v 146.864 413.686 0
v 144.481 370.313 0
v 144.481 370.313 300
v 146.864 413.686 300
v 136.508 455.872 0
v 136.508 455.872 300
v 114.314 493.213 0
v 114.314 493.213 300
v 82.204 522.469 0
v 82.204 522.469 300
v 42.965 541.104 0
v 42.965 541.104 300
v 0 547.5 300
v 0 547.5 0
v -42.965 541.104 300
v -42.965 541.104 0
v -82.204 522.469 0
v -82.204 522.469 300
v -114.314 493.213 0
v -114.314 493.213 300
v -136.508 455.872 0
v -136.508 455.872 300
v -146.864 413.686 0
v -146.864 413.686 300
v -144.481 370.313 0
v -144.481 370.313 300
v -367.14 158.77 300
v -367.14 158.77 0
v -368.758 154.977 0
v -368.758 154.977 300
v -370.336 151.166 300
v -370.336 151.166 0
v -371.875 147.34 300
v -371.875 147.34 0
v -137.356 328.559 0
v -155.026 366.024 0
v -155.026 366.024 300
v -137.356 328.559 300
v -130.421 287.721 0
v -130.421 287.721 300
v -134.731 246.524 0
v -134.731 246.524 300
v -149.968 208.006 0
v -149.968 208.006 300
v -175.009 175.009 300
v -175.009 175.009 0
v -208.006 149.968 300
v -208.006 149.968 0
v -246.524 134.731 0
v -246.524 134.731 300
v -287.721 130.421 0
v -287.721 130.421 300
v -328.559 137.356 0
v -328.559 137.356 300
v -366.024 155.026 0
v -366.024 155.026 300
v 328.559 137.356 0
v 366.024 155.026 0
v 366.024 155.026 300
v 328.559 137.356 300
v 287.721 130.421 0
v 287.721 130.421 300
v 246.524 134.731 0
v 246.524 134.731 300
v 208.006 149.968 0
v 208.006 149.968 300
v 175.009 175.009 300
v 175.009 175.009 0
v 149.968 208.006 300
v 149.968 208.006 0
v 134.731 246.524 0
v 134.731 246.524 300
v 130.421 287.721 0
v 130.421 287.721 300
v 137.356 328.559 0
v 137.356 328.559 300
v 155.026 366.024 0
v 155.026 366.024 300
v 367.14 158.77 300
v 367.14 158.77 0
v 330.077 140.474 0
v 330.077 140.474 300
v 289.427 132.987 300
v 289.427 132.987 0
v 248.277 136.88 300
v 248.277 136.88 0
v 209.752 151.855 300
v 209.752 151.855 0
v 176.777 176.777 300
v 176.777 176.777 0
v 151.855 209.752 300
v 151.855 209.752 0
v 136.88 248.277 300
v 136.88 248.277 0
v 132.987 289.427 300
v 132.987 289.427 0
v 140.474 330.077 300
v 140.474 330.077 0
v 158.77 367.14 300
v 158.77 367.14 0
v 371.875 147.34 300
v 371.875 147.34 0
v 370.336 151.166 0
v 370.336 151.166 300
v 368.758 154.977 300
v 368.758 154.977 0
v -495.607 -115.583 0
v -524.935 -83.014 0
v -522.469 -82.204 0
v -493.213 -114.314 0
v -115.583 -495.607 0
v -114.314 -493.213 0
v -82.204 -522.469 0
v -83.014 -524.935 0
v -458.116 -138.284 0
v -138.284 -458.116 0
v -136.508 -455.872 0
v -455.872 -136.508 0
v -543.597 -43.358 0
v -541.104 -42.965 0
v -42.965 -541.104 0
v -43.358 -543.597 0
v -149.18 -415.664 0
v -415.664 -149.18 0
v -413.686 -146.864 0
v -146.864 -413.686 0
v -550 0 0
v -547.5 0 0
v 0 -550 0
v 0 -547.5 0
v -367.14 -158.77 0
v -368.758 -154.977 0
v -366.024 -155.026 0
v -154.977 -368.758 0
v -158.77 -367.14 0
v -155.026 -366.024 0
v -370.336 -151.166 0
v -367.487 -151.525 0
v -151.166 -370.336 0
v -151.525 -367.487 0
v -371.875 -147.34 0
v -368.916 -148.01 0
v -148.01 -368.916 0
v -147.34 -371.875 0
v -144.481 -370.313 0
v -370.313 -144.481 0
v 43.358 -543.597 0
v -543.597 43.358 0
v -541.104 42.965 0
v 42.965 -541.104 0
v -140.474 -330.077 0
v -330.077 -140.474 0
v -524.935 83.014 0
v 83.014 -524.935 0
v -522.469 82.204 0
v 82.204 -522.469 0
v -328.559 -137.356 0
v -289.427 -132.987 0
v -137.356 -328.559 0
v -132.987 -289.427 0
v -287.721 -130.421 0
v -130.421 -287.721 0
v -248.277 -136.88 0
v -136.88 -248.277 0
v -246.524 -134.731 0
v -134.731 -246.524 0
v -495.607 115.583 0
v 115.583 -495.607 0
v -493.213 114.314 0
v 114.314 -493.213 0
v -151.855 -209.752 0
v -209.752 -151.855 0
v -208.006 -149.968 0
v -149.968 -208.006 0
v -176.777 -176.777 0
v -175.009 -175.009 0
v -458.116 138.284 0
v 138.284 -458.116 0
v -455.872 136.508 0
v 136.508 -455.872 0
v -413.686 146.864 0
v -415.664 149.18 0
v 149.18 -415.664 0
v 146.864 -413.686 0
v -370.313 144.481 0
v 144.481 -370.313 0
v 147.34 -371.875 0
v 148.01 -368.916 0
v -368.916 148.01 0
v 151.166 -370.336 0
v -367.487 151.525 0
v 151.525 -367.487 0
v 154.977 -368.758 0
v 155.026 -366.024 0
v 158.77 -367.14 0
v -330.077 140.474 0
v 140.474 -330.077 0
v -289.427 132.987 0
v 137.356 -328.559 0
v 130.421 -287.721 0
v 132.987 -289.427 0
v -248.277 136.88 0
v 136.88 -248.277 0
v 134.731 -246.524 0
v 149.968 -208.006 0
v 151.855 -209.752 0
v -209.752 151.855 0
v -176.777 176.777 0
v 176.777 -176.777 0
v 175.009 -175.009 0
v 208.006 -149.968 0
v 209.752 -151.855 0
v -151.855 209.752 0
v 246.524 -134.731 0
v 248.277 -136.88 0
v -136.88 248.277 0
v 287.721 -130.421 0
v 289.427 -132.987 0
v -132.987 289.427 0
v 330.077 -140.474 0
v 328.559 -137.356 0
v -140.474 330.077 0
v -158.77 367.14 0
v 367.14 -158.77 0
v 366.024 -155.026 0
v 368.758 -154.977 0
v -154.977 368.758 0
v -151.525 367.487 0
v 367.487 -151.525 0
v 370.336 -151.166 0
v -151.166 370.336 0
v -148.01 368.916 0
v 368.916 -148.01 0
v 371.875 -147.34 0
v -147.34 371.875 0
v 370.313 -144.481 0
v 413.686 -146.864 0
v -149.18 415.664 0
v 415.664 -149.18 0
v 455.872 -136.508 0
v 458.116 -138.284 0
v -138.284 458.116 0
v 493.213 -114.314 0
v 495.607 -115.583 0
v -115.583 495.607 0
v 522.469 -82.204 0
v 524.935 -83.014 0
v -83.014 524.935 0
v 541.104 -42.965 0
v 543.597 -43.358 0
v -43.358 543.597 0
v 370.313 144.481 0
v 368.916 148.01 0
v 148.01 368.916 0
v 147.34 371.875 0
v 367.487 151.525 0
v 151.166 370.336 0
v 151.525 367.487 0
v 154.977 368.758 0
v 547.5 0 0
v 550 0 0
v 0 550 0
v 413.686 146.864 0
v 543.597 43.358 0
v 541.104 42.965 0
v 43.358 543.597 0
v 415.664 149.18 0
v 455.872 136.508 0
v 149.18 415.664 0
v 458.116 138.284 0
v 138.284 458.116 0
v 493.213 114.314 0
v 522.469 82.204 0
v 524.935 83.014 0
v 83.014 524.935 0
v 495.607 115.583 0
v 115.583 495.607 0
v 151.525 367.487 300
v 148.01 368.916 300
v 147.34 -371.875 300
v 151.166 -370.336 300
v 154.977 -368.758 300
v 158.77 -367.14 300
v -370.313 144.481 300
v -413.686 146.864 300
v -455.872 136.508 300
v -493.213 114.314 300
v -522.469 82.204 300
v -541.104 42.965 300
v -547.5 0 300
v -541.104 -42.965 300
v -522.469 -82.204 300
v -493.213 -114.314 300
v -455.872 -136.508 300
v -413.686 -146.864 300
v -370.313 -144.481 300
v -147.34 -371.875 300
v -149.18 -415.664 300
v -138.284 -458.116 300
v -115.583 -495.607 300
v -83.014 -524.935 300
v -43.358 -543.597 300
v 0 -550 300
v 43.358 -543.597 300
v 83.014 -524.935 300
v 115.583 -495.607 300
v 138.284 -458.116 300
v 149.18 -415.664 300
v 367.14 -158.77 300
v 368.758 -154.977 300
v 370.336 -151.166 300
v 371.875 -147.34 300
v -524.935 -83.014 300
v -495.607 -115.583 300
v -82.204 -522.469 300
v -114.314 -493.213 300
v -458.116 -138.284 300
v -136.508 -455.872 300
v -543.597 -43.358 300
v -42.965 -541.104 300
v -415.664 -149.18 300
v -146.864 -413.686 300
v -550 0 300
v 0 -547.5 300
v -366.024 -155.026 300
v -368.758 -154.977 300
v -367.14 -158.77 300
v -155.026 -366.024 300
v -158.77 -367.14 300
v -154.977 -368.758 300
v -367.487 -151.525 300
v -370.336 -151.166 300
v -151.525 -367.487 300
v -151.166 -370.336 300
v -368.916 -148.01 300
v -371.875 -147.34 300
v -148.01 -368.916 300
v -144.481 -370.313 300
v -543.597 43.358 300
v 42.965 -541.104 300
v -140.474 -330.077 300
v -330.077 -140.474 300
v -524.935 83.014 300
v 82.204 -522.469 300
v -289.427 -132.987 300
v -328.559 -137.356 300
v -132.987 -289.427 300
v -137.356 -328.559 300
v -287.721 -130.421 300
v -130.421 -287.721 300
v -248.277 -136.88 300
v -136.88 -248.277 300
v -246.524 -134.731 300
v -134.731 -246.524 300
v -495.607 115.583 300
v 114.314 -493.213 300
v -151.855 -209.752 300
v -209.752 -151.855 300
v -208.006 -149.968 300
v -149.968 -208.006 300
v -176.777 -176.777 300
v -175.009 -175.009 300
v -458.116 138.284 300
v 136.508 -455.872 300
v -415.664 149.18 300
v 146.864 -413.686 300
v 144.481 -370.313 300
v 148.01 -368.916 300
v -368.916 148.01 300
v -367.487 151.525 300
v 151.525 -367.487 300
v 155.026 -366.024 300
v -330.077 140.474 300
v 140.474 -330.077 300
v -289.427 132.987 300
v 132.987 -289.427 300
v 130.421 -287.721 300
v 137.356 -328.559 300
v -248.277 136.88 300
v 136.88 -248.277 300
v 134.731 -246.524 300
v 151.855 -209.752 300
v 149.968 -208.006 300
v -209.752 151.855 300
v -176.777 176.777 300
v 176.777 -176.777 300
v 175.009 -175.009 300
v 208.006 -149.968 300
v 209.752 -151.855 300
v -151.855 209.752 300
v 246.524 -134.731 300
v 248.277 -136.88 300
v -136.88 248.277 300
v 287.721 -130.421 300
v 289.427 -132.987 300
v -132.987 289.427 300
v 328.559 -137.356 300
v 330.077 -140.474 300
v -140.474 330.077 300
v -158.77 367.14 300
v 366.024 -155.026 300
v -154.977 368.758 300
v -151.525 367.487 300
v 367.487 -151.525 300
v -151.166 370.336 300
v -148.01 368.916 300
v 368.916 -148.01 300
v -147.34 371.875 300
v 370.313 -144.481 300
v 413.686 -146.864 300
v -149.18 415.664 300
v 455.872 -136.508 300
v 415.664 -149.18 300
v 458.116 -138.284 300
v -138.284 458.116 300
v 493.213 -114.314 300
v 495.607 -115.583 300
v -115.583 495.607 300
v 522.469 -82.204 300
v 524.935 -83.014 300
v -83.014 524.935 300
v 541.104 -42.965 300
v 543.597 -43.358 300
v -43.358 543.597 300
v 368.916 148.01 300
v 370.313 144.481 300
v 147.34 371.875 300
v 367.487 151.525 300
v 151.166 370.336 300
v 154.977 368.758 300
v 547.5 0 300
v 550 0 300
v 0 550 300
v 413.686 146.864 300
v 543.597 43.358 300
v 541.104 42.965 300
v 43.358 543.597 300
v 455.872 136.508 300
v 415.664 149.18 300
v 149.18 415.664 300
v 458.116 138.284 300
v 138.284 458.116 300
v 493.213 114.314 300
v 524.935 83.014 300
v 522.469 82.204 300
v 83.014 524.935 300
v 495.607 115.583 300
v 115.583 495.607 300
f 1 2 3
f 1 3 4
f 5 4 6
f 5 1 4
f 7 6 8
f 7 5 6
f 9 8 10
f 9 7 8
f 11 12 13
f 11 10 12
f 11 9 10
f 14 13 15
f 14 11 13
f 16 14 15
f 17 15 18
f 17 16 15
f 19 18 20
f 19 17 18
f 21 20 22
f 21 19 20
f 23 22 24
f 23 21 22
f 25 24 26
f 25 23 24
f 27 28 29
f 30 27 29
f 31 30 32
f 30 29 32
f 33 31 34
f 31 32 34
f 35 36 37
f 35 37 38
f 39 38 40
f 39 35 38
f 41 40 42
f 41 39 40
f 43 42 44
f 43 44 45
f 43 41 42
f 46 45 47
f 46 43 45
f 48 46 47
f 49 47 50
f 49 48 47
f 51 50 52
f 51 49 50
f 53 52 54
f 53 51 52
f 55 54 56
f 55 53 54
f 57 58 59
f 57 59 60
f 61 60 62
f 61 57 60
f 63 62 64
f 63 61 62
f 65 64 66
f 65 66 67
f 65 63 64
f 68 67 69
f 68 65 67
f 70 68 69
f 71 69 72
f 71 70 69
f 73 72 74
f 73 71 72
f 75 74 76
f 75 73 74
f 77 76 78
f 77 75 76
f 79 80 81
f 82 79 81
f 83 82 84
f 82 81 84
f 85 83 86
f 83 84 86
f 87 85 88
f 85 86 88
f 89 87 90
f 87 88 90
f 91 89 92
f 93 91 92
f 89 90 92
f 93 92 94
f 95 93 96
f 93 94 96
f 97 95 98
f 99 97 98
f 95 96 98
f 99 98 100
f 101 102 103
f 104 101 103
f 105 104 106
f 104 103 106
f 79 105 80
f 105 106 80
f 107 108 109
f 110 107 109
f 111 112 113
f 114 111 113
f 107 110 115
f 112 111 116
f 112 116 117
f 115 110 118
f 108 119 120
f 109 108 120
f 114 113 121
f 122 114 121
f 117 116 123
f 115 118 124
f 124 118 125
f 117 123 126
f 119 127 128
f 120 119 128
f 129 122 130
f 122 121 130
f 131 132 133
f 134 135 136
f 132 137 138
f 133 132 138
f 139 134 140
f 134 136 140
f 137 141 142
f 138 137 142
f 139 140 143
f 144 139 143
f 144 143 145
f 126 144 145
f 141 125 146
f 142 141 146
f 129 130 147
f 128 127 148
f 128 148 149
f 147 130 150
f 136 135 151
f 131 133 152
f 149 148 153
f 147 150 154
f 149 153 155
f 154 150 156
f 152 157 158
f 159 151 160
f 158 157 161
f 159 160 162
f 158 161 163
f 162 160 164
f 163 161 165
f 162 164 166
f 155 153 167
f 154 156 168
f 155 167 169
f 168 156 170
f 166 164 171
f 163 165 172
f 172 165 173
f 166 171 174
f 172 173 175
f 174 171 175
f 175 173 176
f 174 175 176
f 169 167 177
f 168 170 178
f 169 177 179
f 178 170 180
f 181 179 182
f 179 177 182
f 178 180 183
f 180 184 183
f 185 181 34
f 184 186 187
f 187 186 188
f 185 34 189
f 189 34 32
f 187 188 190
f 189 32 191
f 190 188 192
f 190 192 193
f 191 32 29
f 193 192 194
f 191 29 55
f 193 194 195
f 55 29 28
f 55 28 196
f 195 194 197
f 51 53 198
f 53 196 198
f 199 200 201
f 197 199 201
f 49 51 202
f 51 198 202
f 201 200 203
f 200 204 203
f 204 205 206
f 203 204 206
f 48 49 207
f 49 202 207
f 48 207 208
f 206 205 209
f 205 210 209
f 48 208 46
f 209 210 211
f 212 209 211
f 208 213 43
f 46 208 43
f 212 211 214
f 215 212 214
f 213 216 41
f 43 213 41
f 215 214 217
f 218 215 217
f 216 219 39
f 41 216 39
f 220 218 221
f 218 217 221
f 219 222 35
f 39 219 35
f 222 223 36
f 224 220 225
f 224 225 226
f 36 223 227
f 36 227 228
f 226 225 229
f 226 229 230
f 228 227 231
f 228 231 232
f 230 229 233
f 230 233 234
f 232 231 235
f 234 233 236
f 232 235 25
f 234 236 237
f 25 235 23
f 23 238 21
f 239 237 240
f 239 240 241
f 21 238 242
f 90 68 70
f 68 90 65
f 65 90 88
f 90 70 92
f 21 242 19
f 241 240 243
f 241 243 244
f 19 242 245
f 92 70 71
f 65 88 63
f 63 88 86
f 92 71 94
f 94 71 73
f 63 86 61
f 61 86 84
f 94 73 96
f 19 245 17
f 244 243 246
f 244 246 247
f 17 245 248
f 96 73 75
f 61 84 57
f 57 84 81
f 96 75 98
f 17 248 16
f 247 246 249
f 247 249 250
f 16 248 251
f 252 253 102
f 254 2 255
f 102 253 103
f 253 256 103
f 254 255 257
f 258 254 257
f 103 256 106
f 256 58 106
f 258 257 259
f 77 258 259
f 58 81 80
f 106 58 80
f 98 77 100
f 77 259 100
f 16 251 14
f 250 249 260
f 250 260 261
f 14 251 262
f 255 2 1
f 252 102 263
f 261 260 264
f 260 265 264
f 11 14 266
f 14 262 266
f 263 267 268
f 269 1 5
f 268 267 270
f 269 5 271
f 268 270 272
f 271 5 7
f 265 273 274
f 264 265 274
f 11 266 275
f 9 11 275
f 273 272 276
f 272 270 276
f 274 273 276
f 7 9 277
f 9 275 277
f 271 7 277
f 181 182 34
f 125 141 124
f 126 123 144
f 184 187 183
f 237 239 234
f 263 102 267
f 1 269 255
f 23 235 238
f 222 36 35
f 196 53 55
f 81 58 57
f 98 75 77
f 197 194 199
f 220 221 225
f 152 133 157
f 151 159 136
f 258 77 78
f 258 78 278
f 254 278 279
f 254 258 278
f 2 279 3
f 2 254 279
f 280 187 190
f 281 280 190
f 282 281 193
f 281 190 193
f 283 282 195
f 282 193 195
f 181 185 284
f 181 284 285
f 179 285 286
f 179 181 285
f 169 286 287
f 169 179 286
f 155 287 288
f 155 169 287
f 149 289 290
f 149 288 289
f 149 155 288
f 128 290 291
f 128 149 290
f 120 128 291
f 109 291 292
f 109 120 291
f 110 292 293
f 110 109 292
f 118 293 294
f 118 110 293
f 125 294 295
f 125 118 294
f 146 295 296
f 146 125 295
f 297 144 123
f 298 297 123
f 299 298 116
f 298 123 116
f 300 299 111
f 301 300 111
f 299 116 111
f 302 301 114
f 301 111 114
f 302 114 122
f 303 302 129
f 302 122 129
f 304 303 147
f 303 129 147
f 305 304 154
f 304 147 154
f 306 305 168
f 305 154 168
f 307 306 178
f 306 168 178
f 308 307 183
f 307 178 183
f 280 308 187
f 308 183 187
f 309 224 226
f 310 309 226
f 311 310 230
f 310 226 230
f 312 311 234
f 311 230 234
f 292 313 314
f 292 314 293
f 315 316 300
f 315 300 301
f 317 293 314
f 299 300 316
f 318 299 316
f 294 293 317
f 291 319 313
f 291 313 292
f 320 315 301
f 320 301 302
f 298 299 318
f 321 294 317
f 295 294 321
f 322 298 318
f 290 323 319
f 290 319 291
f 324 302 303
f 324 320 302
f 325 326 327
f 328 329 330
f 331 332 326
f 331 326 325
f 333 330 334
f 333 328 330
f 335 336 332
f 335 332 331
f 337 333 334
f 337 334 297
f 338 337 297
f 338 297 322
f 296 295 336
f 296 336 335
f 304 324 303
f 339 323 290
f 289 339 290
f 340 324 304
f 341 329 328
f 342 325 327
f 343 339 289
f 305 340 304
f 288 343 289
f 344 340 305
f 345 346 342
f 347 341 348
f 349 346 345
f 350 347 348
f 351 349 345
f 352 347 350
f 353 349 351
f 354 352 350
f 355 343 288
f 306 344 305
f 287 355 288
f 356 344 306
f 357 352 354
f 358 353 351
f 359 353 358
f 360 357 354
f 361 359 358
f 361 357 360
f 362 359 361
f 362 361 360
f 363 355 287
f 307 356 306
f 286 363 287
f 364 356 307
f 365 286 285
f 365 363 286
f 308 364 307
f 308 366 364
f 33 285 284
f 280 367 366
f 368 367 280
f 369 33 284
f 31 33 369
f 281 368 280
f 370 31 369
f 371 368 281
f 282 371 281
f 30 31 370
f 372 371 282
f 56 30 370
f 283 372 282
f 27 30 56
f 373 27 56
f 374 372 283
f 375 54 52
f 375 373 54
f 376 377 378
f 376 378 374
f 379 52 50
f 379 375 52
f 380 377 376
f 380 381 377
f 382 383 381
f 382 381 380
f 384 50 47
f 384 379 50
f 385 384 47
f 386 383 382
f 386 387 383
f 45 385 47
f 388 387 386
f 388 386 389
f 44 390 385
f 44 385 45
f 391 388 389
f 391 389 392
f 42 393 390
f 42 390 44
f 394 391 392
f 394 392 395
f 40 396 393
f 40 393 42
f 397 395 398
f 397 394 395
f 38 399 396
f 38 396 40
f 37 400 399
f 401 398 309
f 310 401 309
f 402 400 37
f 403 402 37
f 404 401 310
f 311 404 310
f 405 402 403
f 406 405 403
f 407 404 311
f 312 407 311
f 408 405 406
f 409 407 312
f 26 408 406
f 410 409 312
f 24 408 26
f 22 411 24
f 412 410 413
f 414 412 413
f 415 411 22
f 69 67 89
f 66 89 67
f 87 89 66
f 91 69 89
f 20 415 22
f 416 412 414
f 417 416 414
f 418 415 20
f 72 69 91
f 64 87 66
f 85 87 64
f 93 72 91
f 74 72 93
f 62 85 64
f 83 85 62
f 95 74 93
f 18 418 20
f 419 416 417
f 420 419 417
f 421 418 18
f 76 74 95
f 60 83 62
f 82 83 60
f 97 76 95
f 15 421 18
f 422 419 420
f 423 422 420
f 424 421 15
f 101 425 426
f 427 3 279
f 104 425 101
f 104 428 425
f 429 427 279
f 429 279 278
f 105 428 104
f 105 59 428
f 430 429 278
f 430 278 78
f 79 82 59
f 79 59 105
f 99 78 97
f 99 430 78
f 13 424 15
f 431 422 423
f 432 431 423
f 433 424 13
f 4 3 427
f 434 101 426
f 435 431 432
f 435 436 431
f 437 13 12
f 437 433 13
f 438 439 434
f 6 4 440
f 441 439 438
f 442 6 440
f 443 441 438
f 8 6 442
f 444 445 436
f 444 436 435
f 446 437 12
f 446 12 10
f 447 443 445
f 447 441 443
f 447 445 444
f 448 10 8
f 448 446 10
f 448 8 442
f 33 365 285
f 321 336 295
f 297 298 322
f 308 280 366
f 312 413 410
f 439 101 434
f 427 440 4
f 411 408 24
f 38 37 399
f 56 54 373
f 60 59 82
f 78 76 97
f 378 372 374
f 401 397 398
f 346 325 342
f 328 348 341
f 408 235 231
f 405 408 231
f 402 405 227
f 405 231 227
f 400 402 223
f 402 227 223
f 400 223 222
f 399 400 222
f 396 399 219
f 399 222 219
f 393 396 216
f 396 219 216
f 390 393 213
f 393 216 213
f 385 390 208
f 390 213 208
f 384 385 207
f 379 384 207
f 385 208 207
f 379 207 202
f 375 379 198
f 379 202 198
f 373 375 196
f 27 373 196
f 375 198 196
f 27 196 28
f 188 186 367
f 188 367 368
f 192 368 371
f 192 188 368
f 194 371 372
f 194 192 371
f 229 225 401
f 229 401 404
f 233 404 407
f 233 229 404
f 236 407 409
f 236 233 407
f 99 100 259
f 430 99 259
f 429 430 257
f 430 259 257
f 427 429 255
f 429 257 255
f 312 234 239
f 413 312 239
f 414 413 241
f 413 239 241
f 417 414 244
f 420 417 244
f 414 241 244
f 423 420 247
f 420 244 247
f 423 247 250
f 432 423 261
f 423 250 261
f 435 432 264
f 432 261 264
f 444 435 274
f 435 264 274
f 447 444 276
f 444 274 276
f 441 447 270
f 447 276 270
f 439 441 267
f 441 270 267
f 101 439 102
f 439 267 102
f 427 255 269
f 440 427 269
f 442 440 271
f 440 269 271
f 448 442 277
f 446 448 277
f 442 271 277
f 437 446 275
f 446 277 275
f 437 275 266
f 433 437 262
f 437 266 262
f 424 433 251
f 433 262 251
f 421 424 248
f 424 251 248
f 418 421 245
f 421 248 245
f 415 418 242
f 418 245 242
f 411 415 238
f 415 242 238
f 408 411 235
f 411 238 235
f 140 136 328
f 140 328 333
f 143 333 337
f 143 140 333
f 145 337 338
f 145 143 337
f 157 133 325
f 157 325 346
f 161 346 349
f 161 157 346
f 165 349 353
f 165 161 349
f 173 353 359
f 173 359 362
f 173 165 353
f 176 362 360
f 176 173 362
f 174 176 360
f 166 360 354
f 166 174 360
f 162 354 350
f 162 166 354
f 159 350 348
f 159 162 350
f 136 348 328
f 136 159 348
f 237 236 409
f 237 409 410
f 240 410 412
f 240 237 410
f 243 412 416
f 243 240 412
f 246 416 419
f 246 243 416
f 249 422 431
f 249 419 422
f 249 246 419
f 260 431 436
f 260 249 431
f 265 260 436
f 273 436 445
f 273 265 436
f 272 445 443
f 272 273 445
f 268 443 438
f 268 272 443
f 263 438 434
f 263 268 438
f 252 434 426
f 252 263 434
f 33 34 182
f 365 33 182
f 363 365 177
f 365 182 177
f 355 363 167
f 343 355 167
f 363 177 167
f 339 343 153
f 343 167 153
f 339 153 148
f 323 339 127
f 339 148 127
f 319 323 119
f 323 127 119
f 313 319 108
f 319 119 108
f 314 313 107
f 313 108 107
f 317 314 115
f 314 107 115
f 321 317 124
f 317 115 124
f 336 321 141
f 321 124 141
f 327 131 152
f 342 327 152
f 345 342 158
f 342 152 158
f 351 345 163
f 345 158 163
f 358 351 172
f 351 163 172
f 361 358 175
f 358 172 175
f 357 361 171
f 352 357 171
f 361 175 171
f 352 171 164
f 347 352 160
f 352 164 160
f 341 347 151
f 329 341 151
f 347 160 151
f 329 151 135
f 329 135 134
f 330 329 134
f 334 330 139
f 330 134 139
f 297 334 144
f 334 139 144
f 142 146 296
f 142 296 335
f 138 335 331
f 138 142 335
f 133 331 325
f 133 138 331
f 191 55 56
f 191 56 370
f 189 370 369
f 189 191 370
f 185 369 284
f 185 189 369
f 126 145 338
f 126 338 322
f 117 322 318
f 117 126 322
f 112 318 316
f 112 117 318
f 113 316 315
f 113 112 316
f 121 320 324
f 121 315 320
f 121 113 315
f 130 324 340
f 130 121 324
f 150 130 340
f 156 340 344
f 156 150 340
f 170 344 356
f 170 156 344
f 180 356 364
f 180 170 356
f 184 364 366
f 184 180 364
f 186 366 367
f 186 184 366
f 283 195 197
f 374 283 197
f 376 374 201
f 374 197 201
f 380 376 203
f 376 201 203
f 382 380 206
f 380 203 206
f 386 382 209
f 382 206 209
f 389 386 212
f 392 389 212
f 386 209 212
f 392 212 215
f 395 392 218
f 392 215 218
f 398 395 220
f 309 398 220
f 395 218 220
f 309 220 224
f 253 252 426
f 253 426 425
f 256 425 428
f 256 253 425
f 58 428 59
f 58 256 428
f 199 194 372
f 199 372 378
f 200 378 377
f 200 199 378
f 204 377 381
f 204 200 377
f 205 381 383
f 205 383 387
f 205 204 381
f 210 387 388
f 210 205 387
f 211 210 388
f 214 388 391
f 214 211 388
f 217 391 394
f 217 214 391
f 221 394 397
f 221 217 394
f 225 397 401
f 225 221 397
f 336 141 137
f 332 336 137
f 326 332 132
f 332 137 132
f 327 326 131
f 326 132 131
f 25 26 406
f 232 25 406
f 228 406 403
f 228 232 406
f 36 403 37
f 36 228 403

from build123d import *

# Parameters (mm, degrees)
F1_DEPTH = 300
F2_T     = -2.5


with BuildPart() as f1:
    # F0 (on Top) → F1 (new body)
    with BuildSketch(Plane.XY):
        with BuildLine():
            ThreePointArc((-158.7704400152, 367.1402284923), (-176.7766952966, 176.7766952966), (-367.1402284923, 158.7704400152))
            ThreePointArc((-367.1402284923, 158.7704400152), (-369.5518130045, 153.073372946), (-371.875, 147.3396904266))
            ThreePointArc((-371.875, 147.3396904266), (-550, 0), (-371.875, -147.3396904266))
            ThreePointArc((-371.875, -147.3396904266), (-369.5518130045, -153.073372946), (-367.1402284923, -158.7704400152))
            ThreePointArc((-367.1402284923, -158.7704400152), (-176.7766952966, -176.7766952966), (-158.7704400152, -367.1402284923))
            ThreePointArc((-158.7704400152, -367.1402284923), (-153.073372946, -369.5518130045), (-147.3396904266, -371.875))
            ThreePointArc((-147.3396904266, -371.875), (0, -550), (147.3396904266, -371.875))
            ThreePointArc((147.3396904266, -371.875), (153.073372946, -369.5518130045), (158.7704400152, -367.1402284923))
            ThreePointArc((158.7704400152, -367.1402284923), (176.7766952966, -176.7766952966), (367.1402284923, -158.7704400152))
            ThreePointArc((367.1402284923, -158.7704400152), (369.5518130045, -153.073372946), (371.875, -147.3396904266))
            ThreePointArc((371.875, -147.3396904266), (550, 0), (371.875, 147.3396904266))
            ThreePointArc((371.875, 147.3396904266), (369.5518130045, 153.073372946), (367.1402284923, 158.7704400152))
            ThreePointArc((367.1402284923, 158.7704400152), (176.7766952966, 176.7766952966), (158.7704400152, 367.1402284923))
            ThreePointArc((158.7704400152, 367.1402284923), (153.073372946, 369.5518130045), (147.3396904266, 371.875))
            ThreePointArc((147.3396904266, 371.875), (0, 550), (-147.3396904266, 371.875))
            ThreePointArc((-147.3396904266, 371.875), (-153.073372946, 369.5518130045), (-158.7704400152, 367.1402284923))
        make_face()
    extrude(amount=F1_DEPTH)

    # F2
    f2_openings = [f1.faces().sort_by_distance(p)[0] for p in [
        (0, 0, 300),
        (0, 0, 0),
    ]]
    offset(amount=F2_T, openings=f2_openings, kind=Kind.INTERSECTION)


solid = f1.part
